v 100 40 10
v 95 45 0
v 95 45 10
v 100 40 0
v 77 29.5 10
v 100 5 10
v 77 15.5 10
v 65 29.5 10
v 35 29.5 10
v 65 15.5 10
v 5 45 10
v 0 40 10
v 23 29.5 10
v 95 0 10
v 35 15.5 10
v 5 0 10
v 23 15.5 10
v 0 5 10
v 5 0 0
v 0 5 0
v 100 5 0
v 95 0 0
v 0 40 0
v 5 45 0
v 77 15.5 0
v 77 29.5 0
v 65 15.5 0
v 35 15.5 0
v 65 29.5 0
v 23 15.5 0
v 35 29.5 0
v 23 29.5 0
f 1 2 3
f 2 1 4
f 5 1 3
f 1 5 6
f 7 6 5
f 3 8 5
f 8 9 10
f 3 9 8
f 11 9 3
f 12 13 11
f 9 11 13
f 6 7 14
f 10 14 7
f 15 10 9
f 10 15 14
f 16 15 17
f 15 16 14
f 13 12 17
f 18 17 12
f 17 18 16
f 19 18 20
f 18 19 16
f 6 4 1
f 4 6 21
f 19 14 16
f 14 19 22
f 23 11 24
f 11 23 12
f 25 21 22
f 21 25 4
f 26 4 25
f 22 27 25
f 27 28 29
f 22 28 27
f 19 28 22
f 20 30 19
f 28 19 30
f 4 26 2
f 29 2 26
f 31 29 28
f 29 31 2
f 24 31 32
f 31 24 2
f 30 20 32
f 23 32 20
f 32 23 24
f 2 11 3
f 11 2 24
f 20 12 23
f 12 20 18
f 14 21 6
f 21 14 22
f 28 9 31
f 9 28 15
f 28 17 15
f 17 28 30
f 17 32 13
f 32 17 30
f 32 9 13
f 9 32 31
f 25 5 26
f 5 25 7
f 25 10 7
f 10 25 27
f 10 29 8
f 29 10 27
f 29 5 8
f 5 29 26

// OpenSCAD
$fn = 32;

// ----------------------------------------------------------------------
// Windowed plate: 2 voids, 100 x 45 x 10 mm
// ----------------------------------------------------------------------

// --- parameters (mm) ---
plate_l = 100;            // plate length, X
plate_w = 45;             // plate width, Y
plate_t = 10;             // plate thickness, Z
edge_margin = 8;          // wall from the plate edge to any window
windows = 2;              // number of windows in the row
win_l = 12;               // window length
win_w = 14;               // window width
win_pitch = 42;           // window pitch along X
depth_1 = 10;             // depth of void 1 (full thickness = through)
depth_2 = 10;             // depth of void 2 (full thickness = through)
corner_c = 5;             // corner chamfer of the plate
fit_tol = 0.1;            // declared fit tolerance (prompt contract)
free_tol = 0.3;           // declared free tolerance (prompt contract)

profile = [[5, 0], [95, 0], [100, 5], [100, 40], [95, 45], [5, 45], [0, 40], [0, 5]];  // primary outline, 8 points, counter clockwise
void_1 = [[23, 15.5], [35, 15.5], [35, 29.5], [23, 29.5]];  // window 1 of the row, 4 points
void_2 = [[65, 15.5], [77, 15.5], [77, 29.5], [65, 29.5]];  // window 2 of the row, 4 points

// --- the one profile operation ---
difference() {
  linear_extrude(height = plate_t) polygon(points = profile);
  translate([0, 0, -1])
    linear_extrude(height = plate_t + 2) polygon(points = void_1);
  translate([0, 0, -1])
    linear_extrude(height = plate_t + 2) polygon(points = void_2);
}
